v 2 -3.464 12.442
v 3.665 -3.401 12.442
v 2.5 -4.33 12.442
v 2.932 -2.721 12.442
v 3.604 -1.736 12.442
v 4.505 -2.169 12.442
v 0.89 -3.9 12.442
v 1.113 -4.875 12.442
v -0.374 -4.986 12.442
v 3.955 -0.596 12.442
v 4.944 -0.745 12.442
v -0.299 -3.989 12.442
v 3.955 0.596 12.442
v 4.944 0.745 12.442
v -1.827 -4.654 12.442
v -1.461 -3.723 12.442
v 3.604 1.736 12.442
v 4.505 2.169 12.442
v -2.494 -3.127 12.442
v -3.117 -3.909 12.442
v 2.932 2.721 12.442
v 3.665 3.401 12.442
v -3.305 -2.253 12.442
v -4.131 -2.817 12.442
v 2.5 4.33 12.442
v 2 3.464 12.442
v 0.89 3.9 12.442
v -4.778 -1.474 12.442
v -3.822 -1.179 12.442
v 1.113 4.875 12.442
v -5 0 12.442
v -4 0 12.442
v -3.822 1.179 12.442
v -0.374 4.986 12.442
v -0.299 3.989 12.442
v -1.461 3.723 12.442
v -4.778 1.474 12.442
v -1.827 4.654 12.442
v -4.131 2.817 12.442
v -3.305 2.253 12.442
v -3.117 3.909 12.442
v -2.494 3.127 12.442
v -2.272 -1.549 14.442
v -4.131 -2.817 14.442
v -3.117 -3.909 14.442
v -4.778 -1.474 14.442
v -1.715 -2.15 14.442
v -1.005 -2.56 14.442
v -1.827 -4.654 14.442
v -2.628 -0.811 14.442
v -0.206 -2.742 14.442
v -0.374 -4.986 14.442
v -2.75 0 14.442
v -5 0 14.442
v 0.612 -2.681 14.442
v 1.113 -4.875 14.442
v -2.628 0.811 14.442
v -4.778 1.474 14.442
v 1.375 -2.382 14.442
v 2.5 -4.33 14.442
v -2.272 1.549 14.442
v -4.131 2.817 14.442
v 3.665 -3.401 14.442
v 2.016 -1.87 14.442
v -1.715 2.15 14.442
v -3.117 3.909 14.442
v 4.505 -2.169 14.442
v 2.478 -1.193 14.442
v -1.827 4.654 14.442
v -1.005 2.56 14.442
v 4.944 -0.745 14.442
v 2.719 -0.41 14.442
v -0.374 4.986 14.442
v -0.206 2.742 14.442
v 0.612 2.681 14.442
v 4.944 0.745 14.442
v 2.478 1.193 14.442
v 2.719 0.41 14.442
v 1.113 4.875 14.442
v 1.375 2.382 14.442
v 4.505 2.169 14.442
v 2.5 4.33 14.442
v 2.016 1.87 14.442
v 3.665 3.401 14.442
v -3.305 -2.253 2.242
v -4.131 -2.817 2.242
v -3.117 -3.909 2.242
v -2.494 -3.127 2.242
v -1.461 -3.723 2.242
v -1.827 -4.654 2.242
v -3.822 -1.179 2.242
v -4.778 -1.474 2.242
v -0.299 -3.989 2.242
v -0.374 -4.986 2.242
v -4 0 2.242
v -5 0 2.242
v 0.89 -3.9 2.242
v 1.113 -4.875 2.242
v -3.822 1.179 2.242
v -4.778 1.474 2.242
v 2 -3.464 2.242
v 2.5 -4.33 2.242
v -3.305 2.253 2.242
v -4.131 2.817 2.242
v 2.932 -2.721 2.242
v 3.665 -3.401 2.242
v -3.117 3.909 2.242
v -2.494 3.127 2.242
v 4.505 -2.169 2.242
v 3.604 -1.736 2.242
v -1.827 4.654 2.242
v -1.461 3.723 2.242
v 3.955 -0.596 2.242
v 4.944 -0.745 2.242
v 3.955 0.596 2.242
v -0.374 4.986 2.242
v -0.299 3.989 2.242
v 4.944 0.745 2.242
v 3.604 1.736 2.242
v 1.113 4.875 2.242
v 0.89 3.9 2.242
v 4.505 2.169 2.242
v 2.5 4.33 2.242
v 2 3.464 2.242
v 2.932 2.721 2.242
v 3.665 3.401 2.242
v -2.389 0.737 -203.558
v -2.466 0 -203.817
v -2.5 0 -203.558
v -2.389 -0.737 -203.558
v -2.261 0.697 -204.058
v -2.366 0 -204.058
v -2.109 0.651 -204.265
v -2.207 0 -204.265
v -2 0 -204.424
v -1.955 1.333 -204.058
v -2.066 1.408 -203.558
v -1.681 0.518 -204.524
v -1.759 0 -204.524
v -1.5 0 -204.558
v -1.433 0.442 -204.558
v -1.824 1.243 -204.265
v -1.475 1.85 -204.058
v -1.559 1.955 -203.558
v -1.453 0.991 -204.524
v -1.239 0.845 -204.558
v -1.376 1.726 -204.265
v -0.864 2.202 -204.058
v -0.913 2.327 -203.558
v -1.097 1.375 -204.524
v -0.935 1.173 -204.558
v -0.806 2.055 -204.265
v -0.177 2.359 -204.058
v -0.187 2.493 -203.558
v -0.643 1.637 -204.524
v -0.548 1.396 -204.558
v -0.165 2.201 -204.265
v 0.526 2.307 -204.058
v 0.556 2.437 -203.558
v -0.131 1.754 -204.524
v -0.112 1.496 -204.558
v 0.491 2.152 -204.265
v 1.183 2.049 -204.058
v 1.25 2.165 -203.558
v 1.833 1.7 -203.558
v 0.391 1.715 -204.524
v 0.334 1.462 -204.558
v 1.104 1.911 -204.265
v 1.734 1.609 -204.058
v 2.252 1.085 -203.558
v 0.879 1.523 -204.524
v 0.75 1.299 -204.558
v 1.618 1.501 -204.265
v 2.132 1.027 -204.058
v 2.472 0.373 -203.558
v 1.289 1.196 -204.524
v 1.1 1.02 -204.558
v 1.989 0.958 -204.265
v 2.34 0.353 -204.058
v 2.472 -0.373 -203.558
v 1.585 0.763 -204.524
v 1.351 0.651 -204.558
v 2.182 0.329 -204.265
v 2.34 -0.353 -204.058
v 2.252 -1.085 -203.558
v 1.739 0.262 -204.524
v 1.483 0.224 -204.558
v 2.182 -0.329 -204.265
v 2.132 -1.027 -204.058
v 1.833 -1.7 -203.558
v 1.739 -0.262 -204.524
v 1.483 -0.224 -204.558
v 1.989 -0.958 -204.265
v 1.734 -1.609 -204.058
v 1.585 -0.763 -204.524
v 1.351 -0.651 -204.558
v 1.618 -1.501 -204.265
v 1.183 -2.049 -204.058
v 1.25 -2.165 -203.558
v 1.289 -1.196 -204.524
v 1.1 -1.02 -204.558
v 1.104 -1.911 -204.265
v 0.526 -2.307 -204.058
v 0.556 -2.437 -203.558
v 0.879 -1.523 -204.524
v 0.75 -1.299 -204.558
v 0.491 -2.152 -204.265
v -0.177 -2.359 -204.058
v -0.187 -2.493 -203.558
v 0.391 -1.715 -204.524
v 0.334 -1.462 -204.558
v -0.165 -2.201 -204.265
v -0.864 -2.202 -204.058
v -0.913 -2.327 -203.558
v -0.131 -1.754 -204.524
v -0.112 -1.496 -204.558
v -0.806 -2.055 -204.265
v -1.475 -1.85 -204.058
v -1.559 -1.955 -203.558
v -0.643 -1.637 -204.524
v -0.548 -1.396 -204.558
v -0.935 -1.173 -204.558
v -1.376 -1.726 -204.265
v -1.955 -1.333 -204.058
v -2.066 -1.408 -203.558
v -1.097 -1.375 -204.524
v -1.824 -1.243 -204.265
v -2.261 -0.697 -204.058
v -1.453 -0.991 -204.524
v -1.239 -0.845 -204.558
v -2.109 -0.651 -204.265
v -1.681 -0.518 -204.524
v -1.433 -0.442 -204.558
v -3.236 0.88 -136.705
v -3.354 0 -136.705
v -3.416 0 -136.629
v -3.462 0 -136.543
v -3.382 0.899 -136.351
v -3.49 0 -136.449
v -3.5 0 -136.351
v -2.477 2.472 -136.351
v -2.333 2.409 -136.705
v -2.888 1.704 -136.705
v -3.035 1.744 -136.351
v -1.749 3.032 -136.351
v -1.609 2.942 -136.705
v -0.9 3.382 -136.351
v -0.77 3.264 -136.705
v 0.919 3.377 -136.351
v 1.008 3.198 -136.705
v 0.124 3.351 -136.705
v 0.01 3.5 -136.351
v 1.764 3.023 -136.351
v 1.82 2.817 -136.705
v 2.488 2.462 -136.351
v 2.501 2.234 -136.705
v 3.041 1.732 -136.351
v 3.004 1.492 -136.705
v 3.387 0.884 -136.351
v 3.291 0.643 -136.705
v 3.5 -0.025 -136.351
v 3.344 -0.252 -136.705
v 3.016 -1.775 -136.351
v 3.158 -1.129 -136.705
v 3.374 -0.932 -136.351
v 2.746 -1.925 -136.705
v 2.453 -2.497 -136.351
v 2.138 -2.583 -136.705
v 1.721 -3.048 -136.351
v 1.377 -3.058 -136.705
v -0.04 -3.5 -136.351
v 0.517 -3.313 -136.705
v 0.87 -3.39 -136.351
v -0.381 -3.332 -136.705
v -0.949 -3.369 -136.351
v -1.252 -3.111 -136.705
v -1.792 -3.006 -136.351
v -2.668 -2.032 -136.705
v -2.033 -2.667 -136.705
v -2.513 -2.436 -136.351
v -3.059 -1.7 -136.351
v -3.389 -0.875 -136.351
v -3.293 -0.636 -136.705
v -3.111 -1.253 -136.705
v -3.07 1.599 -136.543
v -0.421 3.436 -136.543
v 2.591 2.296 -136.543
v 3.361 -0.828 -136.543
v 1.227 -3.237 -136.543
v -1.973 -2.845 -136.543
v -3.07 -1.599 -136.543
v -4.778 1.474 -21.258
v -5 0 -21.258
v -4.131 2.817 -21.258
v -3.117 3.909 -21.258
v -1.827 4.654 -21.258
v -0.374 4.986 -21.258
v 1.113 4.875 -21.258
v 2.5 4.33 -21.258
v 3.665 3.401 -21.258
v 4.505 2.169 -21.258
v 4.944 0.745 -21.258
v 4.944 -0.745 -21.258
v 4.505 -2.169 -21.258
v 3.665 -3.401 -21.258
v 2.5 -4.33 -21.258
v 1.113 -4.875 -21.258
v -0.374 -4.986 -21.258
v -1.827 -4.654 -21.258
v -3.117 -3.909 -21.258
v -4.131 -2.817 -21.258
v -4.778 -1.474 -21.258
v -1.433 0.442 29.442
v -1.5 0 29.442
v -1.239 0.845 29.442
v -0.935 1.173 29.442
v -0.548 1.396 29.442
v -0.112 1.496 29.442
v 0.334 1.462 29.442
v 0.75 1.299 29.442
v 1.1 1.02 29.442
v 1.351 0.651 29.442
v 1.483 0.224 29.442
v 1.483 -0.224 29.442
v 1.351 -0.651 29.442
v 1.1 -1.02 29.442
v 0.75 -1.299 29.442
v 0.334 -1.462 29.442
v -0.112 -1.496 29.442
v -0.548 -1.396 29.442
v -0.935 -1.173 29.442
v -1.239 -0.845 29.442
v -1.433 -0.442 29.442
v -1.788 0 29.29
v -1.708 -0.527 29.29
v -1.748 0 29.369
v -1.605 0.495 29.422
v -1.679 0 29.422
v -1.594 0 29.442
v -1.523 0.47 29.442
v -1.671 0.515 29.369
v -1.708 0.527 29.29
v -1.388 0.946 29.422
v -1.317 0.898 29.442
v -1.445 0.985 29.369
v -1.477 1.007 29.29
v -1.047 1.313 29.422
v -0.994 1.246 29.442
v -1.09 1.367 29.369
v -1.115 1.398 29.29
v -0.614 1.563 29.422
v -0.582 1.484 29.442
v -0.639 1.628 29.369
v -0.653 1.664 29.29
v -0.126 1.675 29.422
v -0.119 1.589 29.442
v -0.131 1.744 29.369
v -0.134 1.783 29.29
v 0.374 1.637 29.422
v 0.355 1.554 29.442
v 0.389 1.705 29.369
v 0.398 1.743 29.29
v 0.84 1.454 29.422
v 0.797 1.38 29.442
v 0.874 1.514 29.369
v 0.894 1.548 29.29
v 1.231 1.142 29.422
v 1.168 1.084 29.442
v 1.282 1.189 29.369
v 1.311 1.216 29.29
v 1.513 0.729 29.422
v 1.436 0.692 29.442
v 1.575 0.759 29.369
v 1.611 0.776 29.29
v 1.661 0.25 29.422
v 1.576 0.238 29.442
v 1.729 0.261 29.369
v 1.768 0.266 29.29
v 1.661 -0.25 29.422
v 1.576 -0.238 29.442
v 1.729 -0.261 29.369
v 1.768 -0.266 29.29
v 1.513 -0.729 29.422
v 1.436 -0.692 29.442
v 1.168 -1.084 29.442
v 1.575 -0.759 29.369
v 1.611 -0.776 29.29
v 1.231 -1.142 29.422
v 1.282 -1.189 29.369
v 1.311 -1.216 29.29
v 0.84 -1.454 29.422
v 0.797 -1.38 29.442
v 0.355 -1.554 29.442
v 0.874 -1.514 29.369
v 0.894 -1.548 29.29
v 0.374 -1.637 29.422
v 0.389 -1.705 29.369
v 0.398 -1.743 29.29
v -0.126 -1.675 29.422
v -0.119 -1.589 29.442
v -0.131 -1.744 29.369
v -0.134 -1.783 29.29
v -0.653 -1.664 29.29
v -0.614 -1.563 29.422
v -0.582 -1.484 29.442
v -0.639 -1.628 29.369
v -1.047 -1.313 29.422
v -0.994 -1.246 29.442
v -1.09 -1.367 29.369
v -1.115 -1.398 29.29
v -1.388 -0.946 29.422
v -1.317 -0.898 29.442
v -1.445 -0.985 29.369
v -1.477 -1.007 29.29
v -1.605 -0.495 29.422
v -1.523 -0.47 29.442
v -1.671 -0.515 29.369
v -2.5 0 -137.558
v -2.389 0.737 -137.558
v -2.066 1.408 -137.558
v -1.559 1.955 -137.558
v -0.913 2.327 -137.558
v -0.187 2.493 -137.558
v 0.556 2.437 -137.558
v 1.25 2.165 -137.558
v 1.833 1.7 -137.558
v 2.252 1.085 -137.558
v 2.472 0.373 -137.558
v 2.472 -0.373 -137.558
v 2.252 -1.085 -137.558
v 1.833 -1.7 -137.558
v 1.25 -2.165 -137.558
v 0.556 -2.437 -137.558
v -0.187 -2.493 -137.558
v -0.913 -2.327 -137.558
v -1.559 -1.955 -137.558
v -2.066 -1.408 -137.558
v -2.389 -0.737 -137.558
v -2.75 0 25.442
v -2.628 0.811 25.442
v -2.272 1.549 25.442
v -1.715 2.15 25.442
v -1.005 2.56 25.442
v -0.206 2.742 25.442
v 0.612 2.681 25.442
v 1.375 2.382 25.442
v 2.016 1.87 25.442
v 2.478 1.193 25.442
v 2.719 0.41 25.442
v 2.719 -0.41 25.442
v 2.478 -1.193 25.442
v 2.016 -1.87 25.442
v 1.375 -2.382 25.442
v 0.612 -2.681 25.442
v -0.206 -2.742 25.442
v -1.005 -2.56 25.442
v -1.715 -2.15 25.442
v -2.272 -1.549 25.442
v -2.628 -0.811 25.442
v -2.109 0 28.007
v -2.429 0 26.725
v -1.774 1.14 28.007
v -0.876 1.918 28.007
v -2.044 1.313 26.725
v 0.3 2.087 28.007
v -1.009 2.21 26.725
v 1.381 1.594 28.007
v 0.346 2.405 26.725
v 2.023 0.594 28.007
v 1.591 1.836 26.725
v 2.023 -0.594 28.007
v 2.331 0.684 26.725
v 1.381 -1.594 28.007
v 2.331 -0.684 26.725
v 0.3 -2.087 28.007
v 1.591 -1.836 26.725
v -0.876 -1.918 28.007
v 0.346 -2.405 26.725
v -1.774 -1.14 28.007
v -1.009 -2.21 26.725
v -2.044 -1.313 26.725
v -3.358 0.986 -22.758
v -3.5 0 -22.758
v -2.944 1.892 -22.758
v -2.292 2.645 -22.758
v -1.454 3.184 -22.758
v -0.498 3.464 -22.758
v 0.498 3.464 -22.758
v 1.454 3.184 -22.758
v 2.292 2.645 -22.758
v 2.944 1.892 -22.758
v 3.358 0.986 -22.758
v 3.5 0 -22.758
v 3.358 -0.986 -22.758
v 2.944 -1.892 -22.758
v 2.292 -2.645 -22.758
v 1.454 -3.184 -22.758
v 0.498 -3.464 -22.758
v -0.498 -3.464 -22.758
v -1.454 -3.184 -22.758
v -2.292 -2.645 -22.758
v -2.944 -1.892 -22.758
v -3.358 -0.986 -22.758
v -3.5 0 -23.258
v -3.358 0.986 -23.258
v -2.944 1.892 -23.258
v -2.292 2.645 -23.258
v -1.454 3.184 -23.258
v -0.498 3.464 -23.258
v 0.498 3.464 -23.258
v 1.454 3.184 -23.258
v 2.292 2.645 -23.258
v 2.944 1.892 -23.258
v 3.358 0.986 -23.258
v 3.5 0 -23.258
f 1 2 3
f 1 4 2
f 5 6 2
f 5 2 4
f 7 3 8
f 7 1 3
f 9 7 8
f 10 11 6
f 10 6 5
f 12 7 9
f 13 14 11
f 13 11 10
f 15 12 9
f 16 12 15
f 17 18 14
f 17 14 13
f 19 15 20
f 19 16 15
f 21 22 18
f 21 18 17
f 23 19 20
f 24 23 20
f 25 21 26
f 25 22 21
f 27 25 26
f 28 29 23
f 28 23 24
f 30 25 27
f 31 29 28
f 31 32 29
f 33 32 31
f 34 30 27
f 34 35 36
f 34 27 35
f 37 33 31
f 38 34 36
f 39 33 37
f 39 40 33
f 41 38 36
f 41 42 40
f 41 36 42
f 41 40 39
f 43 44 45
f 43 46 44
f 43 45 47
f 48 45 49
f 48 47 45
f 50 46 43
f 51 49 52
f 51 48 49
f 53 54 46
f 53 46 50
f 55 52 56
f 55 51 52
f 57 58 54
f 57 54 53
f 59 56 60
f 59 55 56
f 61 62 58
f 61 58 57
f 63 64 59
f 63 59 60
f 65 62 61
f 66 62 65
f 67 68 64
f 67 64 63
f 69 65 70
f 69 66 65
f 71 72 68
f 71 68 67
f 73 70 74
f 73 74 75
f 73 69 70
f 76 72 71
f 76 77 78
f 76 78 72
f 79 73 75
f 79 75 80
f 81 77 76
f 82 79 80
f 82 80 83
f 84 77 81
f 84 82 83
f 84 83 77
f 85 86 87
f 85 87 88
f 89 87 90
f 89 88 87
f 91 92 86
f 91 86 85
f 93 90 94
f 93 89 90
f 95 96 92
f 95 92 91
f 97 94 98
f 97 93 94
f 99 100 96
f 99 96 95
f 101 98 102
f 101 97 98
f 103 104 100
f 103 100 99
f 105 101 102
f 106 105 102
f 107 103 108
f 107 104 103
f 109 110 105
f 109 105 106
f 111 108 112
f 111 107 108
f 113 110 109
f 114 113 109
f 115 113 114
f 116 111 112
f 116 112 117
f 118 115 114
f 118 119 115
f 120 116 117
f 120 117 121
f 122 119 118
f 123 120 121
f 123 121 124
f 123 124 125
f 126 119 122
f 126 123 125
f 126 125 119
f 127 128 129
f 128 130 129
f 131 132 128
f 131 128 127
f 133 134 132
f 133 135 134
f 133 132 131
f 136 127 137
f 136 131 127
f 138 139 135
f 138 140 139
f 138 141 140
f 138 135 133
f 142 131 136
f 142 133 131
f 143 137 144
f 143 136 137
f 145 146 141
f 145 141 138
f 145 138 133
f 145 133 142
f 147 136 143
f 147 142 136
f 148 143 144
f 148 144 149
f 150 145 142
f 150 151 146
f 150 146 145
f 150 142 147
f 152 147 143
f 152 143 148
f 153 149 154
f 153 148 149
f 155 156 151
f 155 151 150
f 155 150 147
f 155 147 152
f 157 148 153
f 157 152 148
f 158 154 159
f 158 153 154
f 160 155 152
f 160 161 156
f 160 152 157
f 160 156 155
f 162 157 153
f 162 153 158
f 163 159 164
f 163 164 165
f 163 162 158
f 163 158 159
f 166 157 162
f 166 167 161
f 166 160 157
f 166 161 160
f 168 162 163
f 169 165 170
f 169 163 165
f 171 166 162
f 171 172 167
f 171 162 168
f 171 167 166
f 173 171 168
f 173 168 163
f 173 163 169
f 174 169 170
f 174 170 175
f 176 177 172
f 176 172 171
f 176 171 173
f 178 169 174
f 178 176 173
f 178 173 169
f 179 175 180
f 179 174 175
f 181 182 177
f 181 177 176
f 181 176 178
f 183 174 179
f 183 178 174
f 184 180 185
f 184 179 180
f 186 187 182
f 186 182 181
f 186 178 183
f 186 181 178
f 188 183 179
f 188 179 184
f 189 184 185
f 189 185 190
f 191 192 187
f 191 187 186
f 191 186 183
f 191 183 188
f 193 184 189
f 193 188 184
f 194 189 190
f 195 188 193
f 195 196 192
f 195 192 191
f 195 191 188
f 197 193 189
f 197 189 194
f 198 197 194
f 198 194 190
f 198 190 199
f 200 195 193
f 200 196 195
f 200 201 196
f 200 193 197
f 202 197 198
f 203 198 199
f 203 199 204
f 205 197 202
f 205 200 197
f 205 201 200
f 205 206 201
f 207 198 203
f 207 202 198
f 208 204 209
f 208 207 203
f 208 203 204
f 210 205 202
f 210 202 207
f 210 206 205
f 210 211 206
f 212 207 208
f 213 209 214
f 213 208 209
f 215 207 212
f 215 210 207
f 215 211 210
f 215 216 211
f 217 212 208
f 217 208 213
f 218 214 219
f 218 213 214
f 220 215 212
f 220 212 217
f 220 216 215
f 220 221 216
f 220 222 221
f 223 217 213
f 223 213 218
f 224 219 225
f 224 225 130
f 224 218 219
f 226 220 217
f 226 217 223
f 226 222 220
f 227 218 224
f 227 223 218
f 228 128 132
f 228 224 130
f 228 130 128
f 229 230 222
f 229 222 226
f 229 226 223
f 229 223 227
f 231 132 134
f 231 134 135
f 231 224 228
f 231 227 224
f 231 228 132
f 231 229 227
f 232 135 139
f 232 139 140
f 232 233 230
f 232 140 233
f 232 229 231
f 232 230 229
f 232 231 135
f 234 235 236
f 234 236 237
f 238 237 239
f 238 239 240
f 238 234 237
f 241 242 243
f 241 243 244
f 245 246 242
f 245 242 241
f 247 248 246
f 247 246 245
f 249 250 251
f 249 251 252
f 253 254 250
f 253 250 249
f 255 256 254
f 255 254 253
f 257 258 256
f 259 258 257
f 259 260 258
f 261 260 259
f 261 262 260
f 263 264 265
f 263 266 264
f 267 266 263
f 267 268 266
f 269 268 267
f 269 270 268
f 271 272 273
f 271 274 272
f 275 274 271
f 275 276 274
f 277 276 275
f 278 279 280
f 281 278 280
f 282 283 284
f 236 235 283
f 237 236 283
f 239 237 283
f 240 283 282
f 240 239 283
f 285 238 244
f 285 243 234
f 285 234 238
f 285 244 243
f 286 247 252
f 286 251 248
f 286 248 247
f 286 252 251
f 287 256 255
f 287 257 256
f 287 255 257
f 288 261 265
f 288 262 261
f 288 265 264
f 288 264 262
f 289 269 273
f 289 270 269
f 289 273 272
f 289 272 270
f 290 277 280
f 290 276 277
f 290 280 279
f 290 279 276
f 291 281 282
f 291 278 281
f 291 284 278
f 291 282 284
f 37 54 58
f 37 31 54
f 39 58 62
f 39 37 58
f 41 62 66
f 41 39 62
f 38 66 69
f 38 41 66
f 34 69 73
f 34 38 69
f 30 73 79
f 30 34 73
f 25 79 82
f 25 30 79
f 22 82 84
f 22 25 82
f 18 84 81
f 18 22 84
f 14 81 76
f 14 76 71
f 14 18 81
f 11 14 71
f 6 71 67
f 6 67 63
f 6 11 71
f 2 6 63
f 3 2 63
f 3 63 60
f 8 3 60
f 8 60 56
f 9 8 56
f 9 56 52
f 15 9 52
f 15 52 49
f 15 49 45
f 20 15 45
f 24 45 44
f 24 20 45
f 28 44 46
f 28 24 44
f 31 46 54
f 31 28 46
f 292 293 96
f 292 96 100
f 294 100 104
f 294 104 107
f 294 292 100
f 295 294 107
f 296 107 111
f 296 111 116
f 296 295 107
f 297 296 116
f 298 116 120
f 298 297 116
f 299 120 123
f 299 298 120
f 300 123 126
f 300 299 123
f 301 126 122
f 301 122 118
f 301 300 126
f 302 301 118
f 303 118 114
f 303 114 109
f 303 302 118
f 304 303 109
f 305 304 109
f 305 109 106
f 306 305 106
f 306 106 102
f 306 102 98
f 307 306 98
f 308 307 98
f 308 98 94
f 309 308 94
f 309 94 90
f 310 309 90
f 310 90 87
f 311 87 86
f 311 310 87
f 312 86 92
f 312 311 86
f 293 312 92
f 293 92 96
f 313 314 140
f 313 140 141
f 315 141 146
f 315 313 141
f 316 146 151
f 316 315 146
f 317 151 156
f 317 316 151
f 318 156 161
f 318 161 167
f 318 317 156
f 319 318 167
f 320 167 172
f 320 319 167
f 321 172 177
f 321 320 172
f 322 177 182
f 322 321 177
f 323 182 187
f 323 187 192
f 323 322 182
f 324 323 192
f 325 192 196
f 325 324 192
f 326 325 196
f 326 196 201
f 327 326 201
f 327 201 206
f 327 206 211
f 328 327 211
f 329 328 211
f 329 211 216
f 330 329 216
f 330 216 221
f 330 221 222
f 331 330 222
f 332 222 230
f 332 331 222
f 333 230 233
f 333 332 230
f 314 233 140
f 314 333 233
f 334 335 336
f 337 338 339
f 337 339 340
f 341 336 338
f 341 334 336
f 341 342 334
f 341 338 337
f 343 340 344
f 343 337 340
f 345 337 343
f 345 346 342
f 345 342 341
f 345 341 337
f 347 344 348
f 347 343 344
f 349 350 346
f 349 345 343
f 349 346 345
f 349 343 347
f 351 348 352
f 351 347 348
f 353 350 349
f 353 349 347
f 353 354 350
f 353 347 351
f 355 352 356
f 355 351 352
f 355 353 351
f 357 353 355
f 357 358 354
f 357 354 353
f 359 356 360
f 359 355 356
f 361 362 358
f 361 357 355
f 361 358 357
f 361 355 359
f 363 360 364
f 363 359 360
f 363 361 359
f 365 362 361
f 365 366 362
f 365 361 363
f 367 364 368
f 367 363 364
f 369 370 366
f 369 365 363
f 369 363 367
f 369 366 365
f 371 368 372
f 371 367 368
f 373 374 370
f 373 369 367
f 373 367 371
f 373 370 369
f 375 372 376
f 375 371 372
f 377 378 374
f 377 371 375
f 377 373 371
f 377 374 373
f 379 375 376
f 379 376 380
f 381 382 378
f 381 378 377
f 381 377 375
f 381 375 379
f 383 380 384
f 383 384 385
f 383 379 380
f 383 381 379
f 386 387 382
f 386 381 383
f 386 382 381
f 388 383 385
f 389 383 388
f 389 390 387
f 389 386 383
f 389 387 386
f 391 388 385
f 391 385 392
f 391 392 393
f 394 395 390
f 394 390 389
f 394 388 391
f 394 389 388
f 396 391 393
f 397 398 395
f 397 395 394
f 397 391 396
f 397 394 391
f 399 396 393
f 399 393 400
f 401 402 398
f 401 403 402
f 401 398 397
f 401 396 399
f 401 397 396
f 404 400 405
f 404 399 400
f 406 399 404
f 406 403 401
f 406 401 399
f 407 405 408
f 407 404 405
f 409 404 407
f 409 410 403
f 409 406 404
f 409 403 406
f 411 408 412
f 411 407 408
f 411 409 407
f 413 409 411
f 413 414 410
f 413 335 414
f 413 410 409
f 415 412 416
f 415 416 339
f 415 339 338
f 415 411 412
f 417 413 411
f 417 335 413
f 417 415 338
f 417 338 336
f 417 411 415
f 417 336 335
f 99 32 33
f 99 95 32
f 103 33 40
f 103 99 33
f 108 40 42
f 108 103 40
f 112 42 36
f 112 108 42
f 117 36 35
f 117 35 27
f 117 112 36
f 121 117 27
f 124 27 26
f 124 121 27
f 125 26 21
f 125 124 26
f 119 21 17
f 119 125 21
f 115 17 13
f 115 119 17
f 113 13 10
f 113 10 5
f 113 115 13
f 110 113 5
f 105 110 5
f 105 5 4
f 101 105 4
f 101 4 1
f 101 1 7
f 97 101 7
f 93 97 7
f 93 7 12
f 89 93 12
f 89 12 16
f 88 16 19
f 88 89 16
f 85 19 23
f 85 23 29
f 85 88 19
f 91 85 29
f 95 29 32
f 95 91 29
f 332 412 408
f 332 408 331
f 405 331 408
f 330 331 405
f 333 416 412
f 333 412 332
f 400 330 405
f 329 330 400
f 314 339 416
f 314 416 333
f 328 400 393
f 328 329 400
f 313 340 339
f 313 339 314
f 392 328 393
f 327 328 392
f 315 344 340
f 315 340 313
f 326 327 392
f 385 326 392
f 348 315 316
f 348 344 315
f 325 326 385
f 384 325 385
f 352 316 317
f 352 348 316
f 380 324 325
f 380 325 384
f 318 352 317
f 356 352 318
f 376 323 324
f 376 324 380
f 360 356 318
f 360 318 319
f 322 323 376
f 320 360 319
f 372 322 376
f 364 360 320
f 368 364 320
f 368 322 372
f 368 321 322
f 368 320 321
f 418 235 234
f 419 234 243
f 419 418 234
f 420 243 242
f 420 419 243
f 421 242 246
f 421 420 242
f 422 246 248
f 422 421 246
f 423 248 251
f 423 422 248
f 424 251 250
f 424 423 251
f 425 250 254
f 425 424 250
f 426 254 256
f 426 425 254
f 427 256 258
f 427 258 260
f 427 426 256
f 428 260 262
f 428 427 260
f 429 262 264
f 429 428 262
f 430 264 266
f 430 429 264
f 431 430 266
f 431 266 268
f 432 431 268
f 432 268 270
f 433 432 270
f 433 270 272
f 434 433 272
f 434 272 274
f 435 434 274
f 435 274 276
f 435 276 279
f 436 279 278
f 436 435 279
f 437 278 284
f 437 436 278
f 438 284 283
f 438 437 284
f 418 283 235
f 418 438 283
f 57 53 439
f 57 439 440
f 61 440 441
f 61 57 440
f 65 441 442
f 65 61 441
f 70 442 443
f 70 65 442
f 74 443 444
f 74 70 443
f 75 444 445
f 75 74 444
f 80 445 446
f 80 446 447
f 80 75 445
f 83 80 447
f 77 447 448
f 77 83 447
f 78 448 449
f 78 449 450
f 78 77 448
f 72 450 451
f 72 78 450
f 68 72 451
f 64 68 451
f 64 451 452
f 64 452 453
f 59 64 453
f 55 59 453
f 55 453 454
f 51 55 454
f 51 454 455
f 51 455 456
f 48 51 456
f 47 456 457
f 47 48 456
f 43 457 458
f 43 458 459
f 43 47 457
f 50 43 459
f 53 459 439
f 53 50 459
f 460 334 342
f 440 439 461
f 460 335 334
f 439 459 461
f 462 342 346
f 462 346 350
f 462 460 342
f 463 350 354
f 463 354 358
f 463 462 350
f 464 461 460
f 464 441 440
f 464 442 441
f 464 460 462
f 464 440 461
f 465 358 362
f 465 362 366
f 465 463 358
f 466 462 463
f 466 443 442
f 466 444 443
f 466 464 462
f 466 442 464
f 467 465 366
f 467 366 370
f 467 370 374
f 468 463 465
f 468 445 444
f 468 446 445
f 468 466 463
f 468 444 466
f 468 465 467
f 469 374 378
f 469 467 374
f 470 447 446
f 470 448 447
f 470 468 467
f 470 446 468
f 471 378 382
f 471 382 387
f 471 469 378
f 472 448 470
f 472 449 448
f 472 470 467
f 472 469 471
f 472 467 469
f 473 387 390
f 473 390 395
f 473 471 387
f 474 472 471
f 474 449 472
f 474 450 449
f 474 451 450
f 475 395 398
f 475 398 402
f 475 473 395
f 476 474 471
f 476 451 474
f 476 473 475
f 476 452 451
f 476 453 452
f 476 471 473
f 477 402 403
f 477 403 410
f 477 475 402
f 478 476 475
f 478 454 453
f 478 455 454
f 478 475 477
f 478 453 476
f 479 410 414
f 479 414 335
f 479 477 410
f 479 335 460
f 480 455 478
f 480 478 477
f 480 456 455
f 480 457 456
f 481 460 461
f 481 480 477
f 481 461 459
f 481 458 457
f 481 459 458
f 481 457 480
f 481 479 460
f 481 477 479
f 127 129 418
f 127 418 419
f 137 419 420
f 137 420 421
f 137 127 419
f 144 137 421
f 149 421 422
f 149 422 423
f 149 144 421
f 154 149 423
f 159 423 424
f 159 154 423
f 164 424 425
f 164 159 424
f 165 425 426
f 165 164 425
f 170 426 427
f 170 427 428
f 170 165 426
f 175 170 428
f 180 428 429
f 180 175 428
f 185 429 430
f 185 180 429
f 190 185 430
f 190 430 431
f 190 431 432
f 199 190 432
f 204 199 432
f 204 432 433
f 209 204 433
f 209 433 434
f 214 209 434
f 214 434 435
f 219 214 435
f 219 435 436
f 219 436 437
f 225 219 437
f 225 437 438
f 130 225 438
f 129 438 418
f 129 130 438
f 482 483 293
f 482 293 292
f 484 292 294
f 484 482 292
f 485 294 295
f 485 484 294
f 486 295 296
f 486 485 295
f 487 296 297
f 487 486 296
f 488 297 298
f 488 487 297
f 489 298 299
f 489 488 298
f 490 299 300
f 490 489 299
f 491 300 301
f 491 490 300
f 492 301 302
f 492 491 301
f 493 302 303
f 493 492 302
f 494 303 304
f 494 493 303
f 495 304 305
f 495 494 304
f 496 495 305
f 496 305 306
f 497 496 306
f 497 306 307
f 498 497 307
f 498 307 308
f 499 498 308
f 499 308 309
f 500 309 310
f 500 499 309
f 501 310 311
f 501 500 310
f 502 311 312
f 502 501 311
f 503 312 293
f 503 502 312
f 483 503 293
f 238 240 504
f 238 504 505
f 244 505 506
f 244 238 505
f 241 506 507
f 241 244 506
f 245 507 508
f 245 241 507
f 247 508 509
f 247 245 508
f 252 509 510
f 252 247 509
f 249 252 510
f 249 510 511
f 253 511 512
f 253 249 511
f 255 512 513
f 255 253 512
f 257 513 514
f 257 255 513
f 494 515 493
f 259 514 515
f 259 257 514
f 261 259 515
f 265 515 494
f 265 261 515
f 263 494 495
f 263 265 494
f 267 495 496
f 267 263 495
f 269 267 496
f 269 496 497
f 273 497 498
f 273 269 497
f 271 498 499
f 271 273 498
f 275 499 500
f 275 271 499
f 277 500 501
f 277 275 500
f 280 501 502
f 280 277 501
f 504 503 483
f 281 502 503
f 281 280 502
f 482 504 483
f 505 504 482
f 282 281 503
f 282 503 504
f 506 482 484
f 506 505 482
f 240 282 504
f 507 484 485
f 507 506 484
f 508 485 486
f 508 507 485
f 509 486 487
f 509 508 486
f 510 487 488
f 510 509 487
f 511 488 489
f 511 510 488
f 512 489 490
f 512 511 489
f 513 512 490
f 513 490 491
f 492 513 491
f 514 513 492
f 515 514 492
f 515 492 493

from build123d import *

# Parameters (mm, degrees)
F3_R        = 1.5
F4_DEPTH    = 235.059312583
F5_S5_R     = 3.5
F5_T6_DEPTH = 9
F6_SIZE2    = 4
F6_SIZE     = 1
F7_R        = 0.2
F8_R        = 0.5
F9_R        = 0.99999


# Not quite as in the source:
# - a fillet or chamfer that OpenCascade refuses, or shapes differently, is made with other operations: its cross-section is extruded or revolved along the edge and cut away or added
# - a fillet or chamfer is up to 0.001 mm smaller than in the source, because OpenCascade refuses the exact size


with BuildPart() as f1:
    # F0 (on Front) → F1 (revolve)
    with BuildSketch(Plane.XZ):
        Polygon((-1.5, -204.558312583), (-1.5, 29.441687417), (-2.75, 28.441687417), (-2.75, 14.441687417), (-5, 14.441687417), (-5, 12.441687417), (-4, 12.441687417), (-4, 2.241687417), (-5, 2.241687417), (-5, -22.258312583), (-3.5, -23.258312583), (-3.5, -136.558312583), (-2.5, -137.558312583), (-2.5, -204.558312583), align=None)
        Polygon((-5, -23.258312583), (-3.5, -23.258312583), (-5, -22.258312583), align=None)
        Polygon((-2.75, 28.441687417), (-1.5, 29.441687417), (-2.75, 29.441687417), align=None)
    revolve(axis=Axis((0, 0, -86.958312583), (0, 0, -1)))

    # F3 (on offset) → F4 (cut, through all)
    with BuildSketch(Plane.XY.offset(30.5)):
        Circle(F3_R)
    extrude(amount=-F4_DEPTH, mode=Mode.SUBTRACT)

    # F5: chamfer of 2 on 1 edges, made by hand


with BuildPart() as f5_tool2:
    # F5_s3 → F5_t4 (revolve)
    with BuildSketch(Plane.XZ):
        Polygon((-5, -21.258312583), (-3, -23.258312583), (-5, -23.258312583), align=None)
    revolve(axis=Axis((0, 0, -23.258312583), (0, 0, -1)))

    # F5_s5 → F5_t6 (cut, symmetric)
    with BuildSketch(Plane.XY.offset(-22.3)):
        Circle(F5_S5_R)
    extrude(amount=F5_T6_DEPTH, both=True, mode=Mode.SUBTRACT)


with BuildPart() as f1_1:
    add(f1.part)

    # F5_t1: cut F5_tool2
    add(f5_tool2.part, mode=Mode.SUBTRACT)

    # F6
    f6_edges = [f1_1.edges().sort_by_distance(p)[0] for p in [
        (2.75, 0, 29.441687),
    ]]
    chamfer(f6_edges, length=F6_SIZE, length2=F6_SIZE2)

    # F7
    f7_edges = [f1_1.edges().sort_by_distance(p)[0] for p in [
        (1.75, 0, 29.441687),
    ]]
    fillet(f7_edges, radius=F7_R)

    # F8
    f8_edges = [f1_1.edges().sort_by_distance(p)[0] for p in [
        (3.5, 0, -136.558313),
    ]]
    fillet(f8_edges, radius=F8_R)

    # F9 (radius 1 in the source; OpenCascade refuses exactly that, so slightly less here)
    f9_edges = [f1_1.edges().sort_by_distance(p)[0] for p in [
        (2.5, 0, -204.558313),
    ]]
    fillet(f9_edges, radius=F9_R)


solid = f1_1.part
